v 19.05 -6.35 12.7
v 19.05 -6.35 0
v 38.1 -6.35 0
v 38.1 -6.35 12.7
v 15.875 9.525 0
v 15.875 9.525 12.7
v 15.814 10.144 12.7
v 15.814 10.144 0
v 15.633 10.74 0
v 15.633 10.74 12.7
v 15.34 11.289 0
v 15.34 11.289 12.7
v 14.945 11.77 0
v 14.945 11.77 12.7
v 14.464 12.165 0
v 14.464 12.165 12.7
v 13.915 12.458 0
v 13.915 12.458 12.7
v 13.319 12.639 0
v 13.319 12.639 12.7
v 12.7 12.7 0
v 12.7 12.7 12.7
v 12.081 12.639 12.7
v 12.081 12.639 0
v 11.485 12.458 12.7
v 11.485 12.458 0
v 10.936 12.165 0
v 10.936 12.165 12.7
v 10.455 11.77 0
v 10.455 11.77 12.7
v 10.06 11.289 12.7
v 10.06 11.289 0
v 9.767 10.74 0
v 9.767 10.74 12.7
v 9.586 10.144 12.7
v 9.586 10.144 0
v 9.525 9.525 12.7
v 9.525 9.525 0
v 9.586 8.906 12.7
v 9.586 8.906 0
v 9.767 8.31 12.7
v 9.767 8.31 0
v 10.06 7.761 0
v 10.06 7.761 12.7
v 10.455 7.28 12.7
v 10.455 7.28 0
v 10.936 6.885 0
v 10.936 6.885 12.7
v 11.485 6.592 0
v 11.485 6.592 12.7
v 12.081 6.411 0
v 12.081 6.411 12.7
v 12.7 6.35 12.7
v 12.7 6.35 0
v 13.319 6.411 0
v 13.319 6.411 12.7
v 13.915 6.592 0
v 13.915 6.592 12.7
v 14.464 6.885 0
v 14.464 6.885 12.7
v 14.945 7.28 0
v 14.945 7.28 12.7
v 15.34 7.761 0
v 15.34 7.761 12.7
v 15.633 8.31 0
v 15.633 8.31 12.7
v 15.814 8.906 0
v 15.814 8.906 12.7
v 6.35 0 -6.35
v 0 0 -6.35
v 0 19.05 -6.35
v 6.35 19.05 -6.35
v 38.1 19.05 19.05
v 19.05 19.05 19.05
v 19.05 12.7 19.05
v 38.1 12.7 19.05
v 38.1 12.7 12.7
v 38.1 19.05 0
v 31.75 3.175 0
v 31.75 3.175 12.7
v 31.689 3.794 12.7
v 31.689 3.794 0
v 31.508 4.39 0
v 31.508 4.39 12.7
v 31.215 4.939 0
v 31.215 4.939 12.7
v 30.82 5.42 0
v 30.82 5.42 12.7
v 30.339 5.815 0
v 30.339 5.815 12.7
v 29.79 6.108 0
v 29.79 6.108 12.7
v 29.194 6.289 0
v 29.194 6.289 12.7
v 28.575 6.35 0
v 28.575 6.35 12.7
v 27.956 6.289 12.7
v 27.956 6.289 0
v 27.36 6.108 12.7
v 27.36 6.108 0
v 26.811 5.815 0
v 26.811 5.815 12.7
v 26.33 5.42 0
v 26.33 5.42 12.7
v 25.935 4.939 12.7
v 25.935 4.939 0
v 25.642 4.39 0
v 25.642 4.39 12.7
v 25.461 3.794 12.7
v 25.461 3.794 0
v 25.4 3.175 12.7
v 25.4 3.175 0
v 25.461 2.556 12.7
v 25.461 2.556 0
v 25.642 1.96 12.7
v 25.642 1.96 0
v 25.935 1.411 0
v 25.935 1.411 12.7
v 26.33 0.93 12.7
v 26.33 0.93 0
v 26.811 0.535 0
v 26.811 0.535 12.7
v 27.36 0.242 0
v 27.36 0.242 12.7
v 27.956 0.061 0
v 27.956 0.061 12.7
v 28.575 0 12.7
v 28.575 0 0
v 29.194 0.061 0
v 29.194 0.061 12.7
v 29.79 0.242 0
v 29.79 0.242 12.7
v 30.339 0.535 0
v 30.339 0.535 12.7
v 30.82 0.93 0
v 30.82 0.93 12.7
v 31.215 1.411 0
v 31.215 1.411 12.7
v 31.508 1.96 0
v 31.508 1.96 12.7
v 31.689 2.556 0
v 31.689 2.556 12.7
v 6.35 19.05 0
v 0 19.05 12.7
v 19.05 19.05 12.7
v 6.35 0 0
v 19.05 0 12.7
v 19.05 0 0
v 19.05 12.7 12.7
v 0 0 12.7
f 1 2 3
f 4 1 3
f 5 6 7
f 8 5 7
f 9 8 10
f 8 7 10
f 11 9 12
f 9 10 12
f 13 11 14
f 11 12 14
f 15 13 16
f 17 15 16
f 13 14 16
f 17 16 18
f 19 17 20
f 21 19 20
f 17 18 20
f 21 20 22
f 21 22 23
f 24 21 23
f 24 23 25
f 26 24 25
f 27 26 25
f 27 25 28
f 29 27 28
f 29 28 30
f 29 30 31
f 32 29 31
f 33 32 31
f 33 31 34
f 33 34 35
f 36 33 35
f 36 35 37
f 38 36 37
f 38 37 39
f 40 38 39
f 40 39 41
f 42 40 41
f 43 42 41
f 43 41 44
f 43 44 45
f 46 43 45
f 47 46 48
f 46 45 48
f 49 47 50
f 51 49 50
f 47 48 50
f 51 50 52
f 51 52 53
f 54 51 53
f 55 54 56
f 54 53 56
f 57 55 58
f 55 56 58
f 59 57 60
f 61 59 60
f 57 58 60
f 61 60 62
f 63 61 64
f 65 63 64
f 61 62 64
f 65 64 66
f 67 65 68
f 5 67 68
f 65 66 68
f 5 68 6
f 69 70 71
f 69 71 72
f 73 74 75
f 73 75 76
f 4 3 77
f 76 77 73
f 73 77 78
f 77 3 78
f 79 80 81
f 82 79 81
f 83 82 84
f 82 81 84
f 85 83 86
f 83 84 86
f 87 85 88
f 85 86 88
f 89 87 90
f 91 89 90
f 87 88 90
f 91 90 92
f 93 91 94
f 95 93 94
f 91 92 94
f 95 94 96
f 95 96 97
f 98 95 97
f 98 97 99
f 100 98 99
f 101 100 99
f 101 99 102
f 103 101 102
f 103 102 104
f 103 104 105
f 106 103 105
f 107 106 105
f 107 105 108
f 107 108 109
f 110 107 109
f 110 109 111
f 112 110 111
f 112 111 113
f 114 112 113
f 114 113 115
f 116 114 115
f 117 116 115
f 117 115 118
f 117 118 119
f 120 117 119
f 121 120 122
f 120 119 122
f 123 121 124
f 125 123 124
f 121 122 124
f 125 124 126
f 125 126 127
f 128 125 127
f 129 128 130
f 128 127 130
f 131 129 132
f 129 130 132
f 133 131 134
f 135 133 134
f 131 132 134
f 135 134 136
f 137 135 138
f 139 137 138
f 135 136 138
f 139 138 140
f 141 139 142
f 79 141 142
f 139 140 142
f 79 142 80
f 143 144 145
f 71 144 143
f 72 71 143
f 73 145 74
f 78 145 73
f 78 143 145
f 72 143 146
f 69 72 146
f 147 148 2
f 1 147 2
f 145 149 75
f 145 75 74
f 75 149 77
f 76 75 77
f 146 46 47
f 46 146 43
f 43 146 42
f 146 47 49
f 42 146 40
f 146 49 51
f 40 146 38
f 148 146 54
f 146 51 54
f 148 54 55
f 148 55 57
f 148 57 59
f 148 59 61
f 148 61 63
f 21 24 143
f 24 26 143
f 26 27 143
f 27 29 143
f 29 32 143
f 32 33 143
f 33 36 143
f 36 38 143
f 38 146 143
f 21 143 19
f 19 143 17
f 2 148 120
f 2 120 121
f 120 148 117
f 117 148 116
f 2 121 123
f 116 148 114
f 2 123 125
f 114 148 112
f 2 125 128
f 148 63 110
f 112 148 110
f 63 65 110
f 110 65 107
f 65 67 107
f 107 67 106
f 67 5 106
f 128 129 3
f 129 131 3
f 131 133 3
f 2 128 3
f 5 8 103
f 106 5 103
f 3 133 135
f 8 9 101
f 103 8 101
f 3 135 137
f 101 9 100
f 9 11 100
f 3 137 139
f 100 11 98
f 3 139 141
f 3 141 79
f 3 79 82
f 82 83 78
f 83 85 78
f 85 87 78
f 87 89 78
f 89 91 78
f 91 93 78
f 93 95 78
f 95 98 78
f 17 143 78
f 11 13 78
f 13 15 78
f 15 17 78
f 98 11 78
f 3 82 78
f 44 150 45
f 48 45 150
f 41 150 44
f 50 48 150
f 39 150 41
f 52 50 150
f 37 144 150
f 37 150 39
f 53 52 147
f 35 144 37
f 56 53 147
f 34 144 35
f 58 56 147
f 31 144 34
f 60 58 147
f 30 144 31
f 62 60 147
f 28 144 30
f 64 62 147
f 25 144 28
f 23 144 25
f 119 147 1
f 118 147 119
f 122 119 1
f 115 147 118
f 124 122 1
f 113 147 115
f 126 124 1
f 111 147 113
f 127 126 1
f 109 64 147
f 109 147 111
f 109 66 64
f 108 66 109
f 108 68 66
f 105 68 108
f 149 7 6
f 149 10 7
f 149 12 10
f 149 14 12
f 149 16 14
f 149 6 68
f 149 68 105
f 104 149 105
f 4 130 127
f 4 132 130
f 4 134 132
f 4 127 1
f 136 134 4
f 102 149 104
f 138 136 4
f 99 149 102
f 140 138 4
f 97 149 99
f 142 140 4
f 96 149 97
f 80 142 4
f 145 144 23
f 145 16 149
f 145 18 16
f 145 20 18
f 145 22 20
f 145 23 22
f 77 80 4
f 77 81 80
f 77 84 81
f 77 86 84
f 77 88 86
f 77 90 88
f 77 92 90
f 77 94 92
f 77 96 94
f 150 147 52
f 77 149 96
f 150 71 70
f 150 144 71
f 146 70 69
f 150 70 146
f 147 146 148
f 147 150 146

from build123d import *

# Parameters (mm, degrees)
F1_DEPTH = 12.7
F2_W     = 6.35
F2_H     = 19.05
F3_DEPTH = 6.35
F4_W     = 19.05
F4_H     = 6.35
F5_DEPTH = 6.35
F6_R     = 3.175
F7_DEPTH = 25.4
F8_DEPTH = 25.4


with BuildPart() as f1:
    # F0 (on Top) → F1 (new body)
    with BuildSketch(Plane.XY):
        Polygon((0, 19.05), (0, 0), (19.05, 0), (19.05, -6.35), (38.1, -6.35), (38.1, 19.05), align=None)
    extrude(amount=F1_DEPTH)

    # F2 (on face) → F3 (join)
    with BuildSketch(Plane(origin=(0, 0, 0), x_dir=(1, 0, 0), z_dir=(0, 0, -1))):
        with Locations((3.175, -9.525)):
            Rectangle(F2_W, F2_H)
    extrude(amount=F3_DEPTH)

    # F4 (on face) → F5 (join)
    with BuildSketch(Plane.XY.offset(12.7)):
        with Locations((28.575, 15.875)):
            Rectangle(F4_W, F4_H)
    extrude(amount=F5_DEPTH)

    # F6 (on face) → F7 (cut)
    with BuildSketch(Plane.XY.offset(12.7)):
        with Locations((28.575, 3.175)):
            Circle(F6_R)
    extrude(amount=-F7_DEPTH, mode=Mode.SUBTRACT)

    # F6 (on face) → F8 (cut)
    with BuildSketch(Plane.XY.offset(12.7)):
        with Locations((12.7, 9.525)):
            Circle(F6_R)
    extrude(amount=-F8_DEPTH, mode=Mode.SUBTRACT)


solid = f1.part
